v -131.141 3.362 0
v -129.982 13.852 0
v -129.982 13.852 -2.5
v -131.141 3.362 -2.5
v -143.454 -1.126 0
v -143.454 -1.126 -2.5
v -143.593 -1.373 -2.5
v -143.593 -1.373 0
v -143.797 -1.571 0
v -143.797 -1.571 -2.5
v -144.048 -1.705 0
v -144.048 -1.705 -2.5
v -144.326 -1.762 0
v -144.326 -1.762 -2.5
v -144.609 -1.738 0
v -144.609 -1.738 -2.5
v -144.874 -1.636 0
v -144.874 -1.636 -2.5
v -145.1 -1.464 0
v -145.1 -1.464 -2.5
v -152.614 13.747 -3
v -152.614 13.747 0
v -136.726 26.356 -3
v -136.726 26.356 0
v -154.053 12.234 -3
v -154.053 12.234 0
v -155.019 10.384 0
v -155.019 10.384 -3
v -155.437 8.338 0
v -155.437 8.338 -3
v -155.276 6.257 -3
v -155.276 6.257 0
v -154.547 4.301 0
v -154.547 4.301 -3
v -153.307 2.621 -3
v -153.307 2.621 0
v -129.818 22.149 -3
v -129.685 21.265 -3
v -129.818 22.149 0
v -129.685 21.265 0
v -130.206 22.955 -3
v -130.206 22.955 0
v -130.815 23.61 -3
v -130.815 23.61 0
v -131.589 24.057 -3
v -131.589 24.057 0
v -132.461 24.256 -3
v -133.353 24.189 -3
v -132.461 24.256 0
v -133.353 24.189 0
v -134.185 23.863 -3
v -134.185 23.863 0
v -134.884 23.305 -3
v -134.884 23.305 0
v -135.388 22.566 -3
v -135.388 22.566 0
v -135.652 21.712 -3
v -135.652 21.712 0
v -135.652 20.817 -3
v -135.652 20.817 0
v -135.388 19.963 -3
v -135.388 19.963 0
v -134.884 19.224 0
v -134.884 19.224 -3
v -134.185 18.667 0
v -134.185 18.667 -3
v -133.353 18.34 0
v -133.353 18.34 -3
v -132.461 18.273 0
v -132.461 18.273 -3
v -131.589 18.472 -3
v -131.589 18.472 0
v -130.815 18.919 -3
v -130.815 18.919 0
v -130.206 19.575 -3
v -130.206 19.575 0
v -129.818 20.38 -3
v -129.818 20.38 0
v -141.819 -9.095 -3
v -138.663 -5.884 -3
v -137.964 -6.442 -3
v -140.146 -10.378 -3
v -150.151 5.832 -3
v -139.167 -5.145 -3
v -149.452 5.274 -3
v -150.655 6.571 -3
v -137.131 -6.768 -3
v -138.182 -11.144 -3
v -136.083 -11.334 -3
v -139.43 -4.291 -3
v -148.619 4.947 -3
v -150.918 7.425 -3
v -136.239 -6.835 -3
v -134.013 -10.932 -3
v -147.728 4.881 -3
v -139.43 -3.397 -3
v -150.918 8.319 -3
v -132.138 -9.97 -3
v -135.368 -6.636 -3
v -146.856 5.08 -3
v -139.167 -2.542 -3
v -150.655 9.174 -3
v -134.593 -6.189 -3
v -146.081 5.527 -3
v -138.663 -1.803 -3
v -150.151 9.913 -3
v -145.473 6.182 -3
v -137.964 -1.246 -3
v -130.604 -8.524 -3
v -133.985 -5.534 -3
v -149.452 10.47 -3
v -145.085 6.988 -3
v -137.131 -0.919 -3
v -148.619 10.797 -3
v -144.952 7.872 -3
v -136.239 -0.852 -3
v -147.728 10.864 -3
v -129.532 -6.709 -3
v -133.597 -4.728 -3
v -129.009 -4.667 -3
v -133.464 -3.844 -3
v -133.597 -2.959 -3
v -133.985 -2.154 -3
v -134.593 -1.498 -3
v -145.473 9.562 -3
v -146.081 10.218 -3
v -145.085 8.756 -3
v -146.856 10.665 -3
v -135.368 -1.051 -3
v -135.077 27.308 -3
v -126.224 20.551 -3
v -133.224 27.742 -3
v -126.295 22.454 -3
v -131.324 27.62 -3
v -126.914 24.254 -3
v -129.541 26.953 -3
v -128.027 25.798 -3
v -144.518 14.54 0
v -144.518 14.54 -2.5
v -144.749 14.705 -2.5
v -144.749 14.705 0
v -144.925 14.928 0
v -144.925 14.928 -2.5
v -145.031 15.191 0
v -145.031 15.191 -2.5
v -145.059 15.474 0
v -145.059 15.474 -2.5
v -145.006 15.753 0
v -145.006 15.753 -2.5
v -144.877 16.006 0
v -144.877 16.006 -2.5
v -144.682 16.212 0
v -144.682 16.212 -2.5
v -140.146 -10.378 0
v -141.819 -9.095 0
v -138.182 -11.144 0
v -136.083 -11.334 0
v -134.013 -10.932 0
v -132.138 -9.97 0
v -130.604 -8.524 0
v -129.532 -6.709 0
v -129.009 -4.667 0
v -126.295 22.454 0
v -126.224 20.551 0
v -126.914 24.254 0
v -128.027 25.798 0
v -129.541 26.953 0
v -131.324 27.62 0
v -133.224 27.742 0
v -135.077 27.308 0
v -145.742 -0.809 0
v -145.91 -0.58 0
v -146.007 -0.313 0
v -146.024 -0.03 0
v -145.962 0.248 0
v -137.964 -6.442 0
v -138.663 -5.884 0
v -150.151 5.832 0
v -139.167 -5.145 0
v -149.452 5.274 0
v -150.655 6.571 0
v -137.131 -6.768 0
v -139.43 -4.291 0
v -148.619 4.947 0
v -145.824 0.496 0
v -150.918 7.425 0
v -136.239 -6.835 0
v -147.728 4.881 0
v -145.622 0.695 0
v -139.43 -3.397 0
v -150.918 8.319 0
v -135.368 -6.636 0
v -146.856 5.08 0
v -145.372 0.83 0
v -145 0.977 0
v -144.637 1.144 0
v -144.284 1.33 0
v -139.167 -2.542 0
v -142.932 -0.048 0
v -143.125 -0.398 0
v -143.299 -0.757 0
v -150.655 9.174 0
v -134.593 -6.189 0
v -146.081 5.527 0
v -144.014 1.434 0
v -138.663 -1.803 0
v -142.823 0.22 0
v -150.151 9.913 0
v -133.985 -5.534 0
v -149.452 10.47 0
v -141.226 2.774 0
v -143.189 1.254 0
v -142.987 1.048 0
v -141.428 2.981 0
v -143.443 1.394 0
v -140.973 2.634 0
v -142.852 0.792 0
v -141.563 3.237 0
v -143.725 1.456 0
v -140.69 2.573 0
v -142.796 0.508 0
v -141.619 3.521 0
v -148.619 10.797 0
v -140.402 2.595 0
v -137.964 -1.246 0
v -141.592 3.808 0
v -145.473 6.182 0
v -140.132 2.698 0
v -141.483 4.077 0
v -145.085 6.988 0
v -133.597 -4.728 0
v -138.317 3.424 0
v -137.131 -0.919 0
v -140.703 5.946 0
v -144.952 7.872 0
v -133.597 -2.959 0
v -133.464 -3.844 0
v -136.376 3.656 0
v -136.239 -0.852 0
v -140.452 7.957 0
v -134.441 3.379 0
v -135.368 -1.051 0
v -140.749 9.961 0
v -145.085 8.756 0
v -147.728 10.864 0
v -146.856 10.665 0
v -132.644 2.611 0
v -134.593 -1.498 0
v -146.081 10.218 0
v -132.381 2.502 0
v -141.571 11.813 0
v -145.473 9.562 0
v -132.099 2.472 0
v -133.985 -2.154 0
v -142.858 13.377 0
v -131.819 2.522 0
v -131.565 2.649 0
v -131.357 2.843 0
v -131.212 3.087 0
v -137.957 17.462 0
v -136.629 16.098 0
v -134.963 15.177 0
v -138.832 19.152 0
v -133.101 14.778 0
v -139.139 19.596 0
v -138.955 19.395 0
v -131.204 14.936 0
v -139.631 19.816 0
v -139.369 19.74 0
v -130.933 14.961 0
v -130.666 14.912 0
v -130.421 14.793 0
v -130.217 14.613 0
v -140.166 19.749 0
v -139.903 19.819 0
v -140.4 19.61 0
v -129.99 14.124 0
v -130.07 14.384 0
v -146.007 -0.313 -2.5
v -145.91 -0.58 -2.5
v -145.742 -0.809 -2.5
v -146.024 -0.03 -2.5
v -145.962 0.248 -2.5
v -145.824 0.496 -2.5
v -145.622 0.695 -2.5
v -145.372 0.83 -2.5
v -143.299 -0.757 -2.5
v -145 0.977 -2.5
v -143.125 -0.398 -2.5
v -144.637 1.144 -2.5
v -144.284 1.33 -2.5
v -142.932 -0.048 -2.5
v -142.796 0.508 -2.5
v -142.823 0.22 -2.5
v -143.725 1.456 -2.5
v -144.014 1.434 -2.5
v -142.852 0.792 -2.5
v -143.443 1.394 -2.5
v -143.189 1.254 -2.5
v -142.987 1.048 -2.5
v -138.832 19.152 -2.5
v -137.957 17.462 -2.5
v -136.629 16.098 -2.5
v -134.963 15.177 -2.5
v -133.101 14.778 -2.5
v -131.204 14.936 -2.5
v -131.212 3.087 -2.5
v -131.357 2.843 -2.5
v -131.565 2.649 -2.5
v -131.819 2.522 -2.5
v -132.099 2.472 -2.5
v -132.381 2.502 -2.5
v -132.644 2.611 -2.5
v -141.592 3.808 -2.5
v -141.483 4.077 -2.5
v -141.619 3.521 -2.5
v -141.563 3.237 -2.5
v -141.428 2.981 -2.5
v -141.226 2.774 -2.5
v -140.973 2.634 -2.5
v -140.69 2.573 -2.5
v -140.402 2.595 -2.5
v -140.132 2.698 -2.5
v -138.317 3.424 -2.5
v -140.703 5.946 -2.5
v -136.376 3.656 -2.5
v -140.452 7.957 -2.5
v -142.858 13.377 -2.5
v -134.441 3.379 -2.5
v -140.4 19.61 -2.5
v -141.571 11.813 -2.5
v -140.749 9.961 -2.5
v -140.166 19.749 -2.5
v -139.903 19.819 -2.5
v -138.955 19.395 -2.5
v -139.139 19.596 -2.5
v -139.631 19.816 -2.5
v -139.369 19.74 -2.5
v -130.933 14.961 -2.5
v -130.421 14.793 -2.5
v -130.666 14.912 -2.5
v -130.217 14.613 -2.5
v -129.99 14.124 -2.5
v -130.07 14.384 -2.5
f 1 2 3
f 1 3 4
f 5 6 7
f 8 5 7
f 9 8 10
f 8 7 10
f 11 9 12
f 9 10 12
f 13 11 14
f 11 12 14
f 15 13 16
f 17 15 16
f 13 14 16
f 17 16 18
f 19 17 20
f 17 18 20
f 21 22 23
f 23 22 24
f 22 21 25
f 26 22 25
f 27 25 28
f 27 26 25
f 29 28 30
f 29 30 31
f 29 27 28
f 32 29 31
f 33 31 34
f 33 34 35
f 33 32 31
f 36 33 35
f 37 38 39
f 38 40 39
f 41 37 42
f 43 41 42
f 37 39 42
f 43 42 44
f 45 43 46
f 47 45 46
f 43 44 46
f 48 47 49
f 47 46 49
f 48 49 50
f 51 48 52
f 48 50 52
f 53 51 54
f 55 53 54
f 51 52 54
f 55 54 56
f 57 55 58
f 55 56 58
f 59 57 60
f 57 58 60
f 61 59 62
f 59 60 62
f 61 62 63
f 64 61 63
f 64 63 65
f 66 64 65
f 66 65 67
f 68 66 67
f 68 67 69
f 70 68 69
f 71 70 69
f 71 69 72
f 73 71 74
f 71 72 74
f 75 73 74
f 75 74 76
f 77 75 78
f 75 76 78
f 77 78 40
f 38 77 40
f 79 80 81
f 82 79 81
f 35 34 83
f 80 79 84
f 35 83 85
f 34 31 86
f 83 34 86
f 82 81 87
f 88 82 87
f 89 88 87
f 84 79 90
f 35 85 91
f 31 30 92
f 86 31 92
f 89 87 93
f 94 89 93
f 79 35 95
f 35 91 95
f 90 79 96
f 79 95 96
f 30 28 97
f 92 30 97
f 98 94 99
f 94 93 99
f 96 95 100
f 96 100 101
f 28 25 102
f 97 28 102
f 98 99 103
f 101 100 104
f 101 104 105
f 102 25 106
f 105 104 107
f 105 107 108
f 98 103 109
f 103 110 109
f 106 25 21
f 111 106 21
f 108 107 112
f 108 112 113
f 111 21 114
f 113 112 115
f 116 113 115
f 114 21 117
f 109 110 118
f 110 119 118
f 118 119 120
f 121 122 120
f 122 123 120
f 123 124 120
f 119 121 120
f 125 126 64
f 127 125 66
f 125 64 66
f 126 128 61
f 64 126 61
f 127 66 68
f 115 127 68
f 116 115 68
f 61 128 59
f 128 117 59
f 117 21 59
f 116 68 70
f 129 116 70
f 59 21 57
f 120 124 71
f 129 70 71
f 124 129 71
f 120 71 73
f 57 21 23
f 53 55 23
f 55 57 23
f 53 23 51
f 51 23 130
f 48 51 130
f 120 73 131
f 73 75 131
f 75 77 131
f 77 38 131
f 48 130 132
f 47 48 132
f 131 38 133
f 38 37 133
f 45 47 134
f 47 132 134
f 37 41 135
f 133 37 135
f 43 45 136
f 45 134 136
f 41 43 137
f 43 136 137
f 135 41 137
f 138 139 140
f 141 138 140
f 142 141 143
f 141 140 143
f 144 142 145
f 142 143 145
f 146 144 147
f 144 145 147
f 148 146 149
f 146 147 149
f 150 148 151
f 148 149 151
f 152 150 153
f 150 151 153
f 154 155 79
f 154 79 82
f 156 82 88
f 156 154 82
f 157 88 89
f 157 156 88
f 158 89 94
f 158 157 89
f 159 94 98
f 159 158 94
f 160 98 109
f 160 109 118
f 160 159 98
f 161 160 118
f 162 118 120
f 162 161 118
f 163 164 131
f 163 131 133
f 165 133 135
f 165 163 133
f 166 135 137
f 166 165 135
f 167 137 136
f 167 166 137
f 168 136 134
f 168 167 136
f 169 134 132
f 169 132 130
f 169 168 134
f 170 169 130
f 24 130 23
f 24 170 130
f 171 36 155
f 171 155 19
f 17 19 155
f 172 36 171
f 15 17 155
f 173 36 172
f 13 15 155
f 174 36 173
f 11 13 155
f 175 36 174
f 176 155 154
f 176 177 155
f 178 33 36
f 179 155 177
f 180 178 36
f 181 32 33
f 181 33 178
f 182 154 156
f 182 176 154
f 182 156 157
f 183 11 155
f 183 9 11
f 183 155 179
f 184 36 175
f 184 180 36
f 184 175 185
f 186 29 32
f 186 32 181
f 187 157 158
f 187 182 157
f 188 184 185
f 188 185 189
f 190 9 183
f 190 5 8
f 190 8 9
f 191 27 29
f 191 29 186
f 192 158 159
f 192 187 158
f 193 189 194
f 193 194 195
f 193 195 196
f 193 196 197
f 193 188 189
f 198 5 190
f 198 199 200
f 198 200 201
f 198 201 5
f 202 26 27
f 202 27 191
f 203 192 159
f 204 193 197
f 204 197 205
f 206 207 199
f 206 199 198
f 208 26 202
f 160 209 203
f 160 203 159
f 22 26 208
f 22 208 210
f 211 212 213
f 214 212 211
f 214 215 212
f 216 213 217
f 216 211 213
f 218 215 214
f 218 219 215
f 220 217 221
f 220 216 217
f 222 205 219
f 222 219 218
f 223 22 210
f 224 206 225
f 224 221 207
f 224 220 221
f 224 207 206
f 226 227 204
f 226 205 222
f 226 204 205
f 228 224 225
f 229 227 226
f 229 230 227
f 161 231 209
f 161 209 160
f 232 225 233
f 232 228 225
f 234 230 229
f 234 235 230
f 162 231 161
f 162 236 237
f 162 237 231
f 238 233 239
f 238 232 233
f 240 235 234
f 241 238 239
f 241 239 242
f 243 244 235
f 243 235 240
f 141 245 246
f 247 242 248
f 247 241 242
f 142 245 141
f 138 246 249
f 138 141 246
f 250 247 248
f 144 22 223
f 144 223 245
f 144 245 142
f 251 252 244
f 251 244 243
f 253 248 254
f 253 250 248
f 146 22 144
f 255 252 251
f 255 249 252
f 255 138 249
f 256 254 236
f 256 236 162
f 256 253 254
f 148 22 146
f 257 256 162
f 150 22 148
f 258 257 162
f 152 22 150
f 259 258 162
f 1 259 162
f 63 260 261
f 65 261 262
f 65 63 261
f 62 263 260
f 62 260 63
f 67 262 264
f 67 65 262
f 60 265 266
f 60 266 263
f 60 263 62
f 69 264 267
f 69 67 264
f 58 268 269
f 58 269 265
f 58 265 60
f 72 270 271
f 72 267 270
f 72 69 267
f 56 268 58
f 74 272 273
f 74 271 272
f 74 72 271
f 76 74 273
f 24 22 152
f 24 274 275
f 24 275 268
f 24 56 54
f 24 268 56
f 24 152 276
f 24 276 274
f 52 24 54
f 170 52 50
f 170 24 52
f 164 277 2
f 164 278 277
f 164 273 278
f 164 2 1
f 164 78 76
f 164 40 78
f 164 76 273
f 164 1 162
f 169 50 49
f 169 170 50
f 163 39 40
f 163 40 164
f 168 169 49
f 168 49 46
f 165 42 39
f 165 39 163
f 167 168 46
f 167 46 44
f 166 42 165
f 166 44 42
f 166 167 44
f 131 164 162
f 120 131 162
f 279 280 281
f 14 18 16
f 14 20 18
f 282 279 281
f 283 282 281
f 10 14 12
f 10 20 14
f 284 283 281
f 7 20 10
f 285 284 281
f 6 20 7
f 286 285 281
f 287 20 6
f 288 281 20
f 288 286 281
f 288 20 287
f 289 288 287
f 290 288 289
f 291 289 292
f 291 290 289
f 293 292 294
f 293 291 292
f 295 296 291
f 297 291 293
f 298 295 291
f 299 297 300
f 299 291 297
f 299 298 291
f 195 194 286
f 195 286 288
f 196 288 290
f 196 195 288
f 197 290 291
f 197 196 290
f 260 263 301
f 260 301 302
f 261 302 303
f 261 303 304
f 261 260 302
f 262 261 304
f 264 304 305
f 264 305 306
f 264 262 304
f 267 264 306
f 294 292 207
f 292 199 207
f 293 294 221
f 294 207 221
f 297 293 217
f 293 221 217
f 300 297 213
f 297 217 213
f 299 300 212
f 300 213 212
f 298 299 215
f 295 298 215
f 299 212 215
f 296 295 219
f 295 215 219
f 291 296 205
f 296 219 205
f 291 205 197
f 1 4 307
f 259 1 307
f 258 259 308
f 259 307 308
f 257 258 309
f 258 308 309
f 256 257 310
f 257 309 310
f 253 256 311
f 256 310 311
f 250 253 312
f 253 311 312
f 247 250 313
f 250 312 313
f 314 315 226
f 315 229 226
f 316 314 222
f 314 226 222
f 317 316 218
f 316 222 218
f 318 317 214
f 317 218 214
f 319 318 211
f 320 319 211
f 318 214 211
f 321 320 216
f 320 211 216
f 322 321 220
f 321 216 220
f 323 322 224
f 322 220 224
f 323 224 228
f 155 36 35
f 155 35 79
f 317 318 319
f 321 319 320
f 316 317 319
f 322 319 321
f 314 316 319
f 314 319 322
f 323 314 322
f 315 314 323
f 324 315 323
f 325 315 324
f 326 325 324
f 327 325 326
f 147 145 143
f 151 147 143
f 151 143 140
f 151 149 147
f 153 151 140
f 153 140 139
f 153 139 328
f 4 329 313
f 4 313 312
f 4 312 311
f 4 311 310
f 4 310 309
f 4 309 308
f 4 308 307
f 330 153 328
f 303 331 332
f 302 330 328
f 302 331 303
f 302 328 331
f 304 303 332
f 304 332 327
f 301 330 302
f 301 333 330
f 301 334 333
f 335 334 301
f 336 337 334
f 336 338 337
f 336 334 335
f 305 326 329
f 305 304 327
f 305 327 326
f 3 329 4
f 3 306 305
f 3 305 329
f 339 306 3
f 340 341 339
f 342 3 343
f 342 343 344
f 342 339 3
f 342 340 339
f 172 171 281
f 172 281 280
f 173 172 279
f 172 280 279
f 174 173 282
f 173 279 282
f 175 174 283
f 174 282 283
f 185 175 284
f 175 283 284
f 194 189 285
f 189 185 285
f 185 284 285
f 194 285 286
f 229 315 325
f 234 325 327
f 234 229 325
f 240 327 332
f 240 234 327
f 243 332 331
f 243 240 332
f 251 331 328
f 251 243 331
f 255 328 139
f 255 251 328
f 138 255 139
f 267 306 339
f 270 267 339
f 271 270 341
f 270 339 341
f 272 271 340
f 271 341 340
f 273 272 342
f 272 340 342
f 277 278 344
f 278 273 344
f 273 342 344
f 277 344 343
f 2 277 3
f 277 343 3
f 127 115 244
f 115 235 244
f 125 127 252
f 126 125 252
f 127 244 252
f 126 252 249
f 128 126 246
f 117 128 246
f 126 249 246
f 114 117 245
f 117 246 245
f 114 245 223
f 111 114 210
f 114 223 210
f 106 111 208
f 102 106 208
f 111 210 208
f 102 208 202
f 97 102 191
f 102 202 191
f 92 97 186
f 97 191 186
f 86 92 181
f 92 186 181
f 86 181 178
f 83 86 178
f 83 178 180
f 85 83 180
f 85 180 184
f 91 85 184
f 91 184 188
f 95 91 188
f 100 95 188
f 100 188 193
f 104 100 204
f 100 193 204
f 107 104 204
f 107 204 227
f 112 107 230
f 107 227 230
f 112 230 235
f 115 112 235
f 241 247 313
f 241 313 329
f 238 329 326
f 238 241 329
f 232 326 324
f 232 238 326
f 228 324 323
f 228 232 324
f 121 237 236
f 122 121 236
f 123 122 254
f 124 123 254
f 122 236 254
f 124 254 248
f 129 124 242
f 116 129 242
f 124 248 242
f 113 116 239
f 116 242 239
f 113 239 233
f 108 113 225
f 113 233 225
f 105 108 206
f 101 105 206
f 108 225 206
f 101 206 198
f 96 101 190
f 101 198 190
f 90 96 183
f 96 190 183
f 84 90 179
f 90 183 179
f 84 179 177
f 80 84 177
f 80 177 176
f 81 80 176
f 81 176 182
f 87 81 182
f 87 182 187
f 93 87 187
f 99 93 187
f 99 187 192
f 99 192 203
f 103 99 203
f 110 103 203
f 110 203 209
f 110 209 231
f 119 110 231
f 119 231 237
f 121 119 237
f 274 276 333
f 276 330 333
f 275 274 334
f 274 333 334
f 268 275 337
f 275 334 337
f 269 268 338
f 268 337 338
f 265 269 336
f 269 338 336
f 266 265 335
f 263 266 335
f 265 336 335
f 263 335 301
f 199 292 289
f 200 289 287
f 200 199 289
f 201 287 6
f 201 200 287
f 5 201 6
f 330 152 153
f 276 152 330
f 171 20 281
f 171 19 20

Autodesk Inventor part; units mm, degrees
ref_plane "YZ Plane" through (0, 0, 0) normal (1, 0, 0) x (0, 1, 0)
ref_plane "XZ Plane" through (0, 0, 0) normal (0, 1, 0) x (-1, 0, 0)
ref_plane "XY Plane" through (0, 0, 0) normal (0, 0, 1) x (1, 0, 0)
sketch "スケッチ1" plane through (0, 0, 0) normal (0, 0, 1) x (1, 0, 0)
  circle A0 centre (-132.6852, 21.2646) radius 3
  circle A1 centre (-105.2485, 37.922) radius 3
  circle A2 centre (-84.1159, 33.5789) radius 3
  circle A3 centre (-77.8119, 54.5794) radius 3
  circle A4 centre (-112.1063, 12.5661) radius 3
  circle A5 centre (-136.4636, -3.8437) radius 3
  circle A6 centre (-147.9517, 7.8722) radius 3
  line L0 (-62.3105, 66.9855) -> (-56.4162, 71.4105)
  line L1 (-56.4162, 71.4105) -> (-60.2332, 71.5281)
  arc A7 (-60.2332, 71.5281) -> (-64.0951, 70.5113) centre (-60.4494, 64.5064) ccw
  line L2 (-64.0951, 70.5113) -> (-153.1544, 16.4415)
  arc A8 (-153.1544, 16.4415) -> (-154.1888, 0.0236) centre (-147.9517, 7.8722) ccw
  line L3 (-154.1888, 0.0236) -> (-141.4408, -10.1069)
  arc A9 (-141.4408, -10.1069) -> (-131.6607, -10.2415) centre (-136.4636, -3.8437) ccw
  line L4 (-131.6607, -10.2415) -> (-40.2316, 58.3956)
  arc A10 (-40.2316, 58.3956) -> (-37.5466, 65.3193) centre (-44.4492, 64.0137) ccw
  line L5 (-37.5466, 65.3193) -> (-62.5812, 46.5254)
  arc A11 (-66.3034, 51.4837) -> (-62.5812, 46.5254) centre (-64.4423, 49.0046) ccw
  line L6 (-66.3034, 51.4837) -> (-41.2688, 70.2776)
  arc A12 (-41.2688, 70.2776) -> (-44.233, 71.0354) centre (-44.4492, 64.0137) ccw
  line L7 (-44.233, 71.0354) -> (-46.496, 71.105)
  line L8 (-46.496, 71.105) -> (-58.5883, 62.0272)
  arc A13 (-62.3105, 66.9855) -> (-58.5883, 62.0272) centre (-60.4494, 64.5064) ccw
  circle A14 centre (-147.9517, 7.8722) radius 1.5
  circle A15 centre (-147.9517, 7.8722) radius 7.5
  circle A16 centre (-136.4636, -3.8437) radius 1.5
  circle A17 centre (-136.4636, -3.8437) radius 7.5
  circle A18 centre (-132.6852, 21.2646) radius 1.5
  circle A19 centre (-132.6852, 21.2646) radius 6.5
  line L9 (-152.6141, 13.7469) -> (-136.7259, 26.3561)
  line L10 (-126.2244, 20.5513) -> (-129.0089, -4.6668)
  line L11 (-153.3068, 2.6212) -> (-141.8187, -9.0947)
  point P0 (0, 0)
  point P1 (0, 0)
  dimension "d0" = 15
  dimension "d1" = 15
extrude "押し出し1" add sketch "スケッチ1" against normal blind 3 contours A19 | A19 L10 A17 L11 A15 L9 | A15 | A17
sketch "スケッチ2" plane through (0, 0, 0) normal (0, 0, 1) x (1, 0, 0)
  arc A0 (-152.6141, 13.7469) -> (-153.3068, 2.6212) centre (-147.9517, 7.8722) ccw projected
  line L0 (-153.3068, 2.6212) -> (-141.8187, -9.0947) projected
  arc A1 (-141.8187, -9.0947) -> (-129.0089, -4.6668) centre (-136.4636, -3.8437) ccw projected
  line L1 (-129.0089, -4.6668) -> (-126.2244, 20.5513) projected
  arc A2 (-126.2244, 20.5513) -> (-136.7259, 26.3561) centre (-132.6852, 21.2646) ccw projected
  line L2 (-136.7259, 26.3561) -> (-152.6141, 13.7469) projected
  circle A3 centre (-136.4636, -3.8437) radius 3 projected
  circle A4 centre (-132.6852, 21.2646) radius 3 projected
  circle A5 centre (-147.9517, 7.8722) radius 3 projected
  line L3 (-129.2063, 20.8805) -> (-131.9908, -4.3375)
  arc A6 (-139.6766, -6.9943) -> (-131.9908, -4.3375) centre (-136.4636, -3.8437) ccw
  line L4 (-139.6766, -6.9943) -> (-151.1648, 4.7216)
  arc A7 (-150.7491, 11.397) -> (-151.1648, 4.7216) centre (-147.9517, 7.8722) ccw
  line L5 (-150.7491, 11.397) -> (-134.8609, 24.0062)
  arc A8 (-129.2063, 20.8805) -> (-134.8609, 24.0062) centre (-132.6852, 21.2646) ccw
  arc A9 (-152.6141, 13.7469) -> (-153.3068, 2.6212) centre (-147.9517, 7.8722) ccw projected
  circle A10 centre (-147.9517, 7.8722) radius 7.5
  circle A11 centre (-132.6852, 21.2646) radius 6.5
  circle A12 centre (-136.4636, -3.8437) radius 7.5
  point P0 (0, 0)
  point P1 (-143.8774, -2.7102)
  point P2 (-131.3323, 1.6262)
  point P3 (-129.8074, 15.4364)
  point P4 (-139.1512, 20.6013)
  point P5 (-146.0493, 15.1269)
  point P6 (-146.964, 0.4375)
  dimension "d4" = 3
extrude "押し出し2" cut sketch "スケッチ2" against normal blind 2.5 contours L5 A11 L3 A12 L4 A10
sketch "スケッチ3" plane through (0, 0, 0) normal (0, 0, 1) x (1, 0, 0)
  arc A0 (-146.964, 0.4375) -> (-146.0493, 15.1269) centre (-147.9517, 7.8722) ccw projected
  line L0 (-146.0493, 15.1269) -> (-139.1512, 20.6013) projected
  arc A1 (-139.1512, 20.6013) -> (-129.8074, 15.4364) centre (-132.6852, 21.2646) ccw projected
  line L1 (-129.8074, 15.4364) -> (-131.3323, 1.6262) projected
  arc A2 (-131.3323, 1.6262) -> (-143.8774, -2.7102) centre (-136.4636, -3.8437) ccw projected
  line L2 (-143.8774, -2.7102) -> (-146.964, 0.4375) projected
  arc A3 (-152.6141, 13.7469) -> (-153.3068, 2.6212) centre (-147.9517, 7.8722) ccw projected
  line L3 (-153.3068, 2.6212) -> (-141.8187, -9.0947) projected
  arc A4 (-141.8187, -9.0947) -> (-129.0089, -4.6668) centre (-136.4636, -3.8437) ccw projected
  line L4 (-129.0089, -4.6668) -> (-126.2244, 20.5513) projected
  arc A5 (-126.2244, 20.5513) -> (-136.7259, 26.3561) centre (-132.6852, 21.2646) ccw projected
  line L5 (-136.7259, 26.3561) -> (-152.6141, 13.7469) projected
  circle A6 centre (-136.4636, -3.8437) radius 3 projected
  circle A7 centre (-132.6852, 21.2646) radius 3 projected
  circle A8 centre (-147.9517, 7.8722) radius 3 projected
  arc A9 (-142.9322, -0.048) -> (-144.2837, 1.3303) centre (-143.7947, 0.4581) ccw
  arc A10 (-141.4831, 4.0765) -> (-140.1316, 2.6982) centre (-140.6207, 3.5704) ccw
  point P0 (0, 0)
  dimension "d7" = 2
  dimension "d8" = 2
extrude "押し出し3" add sketch "スケッチ3" against normal blind 3 contours A0 A10 A2 A9
fillet "フィレット1" radius 1 6 edges at (-146.964, 0.4375, -1.25) (-143.8774, -2.7102, -1.25) (-146.0493, 15.1269, -1.25) (-139.1512, 20.6013, -1.25) (-129.8074, 15.4364, -1.25) (-131.3323, 1.6262, -1.25)
properties part number "アーム 中間節 先端中詰め" material "ポリカーボネート、クリア"
